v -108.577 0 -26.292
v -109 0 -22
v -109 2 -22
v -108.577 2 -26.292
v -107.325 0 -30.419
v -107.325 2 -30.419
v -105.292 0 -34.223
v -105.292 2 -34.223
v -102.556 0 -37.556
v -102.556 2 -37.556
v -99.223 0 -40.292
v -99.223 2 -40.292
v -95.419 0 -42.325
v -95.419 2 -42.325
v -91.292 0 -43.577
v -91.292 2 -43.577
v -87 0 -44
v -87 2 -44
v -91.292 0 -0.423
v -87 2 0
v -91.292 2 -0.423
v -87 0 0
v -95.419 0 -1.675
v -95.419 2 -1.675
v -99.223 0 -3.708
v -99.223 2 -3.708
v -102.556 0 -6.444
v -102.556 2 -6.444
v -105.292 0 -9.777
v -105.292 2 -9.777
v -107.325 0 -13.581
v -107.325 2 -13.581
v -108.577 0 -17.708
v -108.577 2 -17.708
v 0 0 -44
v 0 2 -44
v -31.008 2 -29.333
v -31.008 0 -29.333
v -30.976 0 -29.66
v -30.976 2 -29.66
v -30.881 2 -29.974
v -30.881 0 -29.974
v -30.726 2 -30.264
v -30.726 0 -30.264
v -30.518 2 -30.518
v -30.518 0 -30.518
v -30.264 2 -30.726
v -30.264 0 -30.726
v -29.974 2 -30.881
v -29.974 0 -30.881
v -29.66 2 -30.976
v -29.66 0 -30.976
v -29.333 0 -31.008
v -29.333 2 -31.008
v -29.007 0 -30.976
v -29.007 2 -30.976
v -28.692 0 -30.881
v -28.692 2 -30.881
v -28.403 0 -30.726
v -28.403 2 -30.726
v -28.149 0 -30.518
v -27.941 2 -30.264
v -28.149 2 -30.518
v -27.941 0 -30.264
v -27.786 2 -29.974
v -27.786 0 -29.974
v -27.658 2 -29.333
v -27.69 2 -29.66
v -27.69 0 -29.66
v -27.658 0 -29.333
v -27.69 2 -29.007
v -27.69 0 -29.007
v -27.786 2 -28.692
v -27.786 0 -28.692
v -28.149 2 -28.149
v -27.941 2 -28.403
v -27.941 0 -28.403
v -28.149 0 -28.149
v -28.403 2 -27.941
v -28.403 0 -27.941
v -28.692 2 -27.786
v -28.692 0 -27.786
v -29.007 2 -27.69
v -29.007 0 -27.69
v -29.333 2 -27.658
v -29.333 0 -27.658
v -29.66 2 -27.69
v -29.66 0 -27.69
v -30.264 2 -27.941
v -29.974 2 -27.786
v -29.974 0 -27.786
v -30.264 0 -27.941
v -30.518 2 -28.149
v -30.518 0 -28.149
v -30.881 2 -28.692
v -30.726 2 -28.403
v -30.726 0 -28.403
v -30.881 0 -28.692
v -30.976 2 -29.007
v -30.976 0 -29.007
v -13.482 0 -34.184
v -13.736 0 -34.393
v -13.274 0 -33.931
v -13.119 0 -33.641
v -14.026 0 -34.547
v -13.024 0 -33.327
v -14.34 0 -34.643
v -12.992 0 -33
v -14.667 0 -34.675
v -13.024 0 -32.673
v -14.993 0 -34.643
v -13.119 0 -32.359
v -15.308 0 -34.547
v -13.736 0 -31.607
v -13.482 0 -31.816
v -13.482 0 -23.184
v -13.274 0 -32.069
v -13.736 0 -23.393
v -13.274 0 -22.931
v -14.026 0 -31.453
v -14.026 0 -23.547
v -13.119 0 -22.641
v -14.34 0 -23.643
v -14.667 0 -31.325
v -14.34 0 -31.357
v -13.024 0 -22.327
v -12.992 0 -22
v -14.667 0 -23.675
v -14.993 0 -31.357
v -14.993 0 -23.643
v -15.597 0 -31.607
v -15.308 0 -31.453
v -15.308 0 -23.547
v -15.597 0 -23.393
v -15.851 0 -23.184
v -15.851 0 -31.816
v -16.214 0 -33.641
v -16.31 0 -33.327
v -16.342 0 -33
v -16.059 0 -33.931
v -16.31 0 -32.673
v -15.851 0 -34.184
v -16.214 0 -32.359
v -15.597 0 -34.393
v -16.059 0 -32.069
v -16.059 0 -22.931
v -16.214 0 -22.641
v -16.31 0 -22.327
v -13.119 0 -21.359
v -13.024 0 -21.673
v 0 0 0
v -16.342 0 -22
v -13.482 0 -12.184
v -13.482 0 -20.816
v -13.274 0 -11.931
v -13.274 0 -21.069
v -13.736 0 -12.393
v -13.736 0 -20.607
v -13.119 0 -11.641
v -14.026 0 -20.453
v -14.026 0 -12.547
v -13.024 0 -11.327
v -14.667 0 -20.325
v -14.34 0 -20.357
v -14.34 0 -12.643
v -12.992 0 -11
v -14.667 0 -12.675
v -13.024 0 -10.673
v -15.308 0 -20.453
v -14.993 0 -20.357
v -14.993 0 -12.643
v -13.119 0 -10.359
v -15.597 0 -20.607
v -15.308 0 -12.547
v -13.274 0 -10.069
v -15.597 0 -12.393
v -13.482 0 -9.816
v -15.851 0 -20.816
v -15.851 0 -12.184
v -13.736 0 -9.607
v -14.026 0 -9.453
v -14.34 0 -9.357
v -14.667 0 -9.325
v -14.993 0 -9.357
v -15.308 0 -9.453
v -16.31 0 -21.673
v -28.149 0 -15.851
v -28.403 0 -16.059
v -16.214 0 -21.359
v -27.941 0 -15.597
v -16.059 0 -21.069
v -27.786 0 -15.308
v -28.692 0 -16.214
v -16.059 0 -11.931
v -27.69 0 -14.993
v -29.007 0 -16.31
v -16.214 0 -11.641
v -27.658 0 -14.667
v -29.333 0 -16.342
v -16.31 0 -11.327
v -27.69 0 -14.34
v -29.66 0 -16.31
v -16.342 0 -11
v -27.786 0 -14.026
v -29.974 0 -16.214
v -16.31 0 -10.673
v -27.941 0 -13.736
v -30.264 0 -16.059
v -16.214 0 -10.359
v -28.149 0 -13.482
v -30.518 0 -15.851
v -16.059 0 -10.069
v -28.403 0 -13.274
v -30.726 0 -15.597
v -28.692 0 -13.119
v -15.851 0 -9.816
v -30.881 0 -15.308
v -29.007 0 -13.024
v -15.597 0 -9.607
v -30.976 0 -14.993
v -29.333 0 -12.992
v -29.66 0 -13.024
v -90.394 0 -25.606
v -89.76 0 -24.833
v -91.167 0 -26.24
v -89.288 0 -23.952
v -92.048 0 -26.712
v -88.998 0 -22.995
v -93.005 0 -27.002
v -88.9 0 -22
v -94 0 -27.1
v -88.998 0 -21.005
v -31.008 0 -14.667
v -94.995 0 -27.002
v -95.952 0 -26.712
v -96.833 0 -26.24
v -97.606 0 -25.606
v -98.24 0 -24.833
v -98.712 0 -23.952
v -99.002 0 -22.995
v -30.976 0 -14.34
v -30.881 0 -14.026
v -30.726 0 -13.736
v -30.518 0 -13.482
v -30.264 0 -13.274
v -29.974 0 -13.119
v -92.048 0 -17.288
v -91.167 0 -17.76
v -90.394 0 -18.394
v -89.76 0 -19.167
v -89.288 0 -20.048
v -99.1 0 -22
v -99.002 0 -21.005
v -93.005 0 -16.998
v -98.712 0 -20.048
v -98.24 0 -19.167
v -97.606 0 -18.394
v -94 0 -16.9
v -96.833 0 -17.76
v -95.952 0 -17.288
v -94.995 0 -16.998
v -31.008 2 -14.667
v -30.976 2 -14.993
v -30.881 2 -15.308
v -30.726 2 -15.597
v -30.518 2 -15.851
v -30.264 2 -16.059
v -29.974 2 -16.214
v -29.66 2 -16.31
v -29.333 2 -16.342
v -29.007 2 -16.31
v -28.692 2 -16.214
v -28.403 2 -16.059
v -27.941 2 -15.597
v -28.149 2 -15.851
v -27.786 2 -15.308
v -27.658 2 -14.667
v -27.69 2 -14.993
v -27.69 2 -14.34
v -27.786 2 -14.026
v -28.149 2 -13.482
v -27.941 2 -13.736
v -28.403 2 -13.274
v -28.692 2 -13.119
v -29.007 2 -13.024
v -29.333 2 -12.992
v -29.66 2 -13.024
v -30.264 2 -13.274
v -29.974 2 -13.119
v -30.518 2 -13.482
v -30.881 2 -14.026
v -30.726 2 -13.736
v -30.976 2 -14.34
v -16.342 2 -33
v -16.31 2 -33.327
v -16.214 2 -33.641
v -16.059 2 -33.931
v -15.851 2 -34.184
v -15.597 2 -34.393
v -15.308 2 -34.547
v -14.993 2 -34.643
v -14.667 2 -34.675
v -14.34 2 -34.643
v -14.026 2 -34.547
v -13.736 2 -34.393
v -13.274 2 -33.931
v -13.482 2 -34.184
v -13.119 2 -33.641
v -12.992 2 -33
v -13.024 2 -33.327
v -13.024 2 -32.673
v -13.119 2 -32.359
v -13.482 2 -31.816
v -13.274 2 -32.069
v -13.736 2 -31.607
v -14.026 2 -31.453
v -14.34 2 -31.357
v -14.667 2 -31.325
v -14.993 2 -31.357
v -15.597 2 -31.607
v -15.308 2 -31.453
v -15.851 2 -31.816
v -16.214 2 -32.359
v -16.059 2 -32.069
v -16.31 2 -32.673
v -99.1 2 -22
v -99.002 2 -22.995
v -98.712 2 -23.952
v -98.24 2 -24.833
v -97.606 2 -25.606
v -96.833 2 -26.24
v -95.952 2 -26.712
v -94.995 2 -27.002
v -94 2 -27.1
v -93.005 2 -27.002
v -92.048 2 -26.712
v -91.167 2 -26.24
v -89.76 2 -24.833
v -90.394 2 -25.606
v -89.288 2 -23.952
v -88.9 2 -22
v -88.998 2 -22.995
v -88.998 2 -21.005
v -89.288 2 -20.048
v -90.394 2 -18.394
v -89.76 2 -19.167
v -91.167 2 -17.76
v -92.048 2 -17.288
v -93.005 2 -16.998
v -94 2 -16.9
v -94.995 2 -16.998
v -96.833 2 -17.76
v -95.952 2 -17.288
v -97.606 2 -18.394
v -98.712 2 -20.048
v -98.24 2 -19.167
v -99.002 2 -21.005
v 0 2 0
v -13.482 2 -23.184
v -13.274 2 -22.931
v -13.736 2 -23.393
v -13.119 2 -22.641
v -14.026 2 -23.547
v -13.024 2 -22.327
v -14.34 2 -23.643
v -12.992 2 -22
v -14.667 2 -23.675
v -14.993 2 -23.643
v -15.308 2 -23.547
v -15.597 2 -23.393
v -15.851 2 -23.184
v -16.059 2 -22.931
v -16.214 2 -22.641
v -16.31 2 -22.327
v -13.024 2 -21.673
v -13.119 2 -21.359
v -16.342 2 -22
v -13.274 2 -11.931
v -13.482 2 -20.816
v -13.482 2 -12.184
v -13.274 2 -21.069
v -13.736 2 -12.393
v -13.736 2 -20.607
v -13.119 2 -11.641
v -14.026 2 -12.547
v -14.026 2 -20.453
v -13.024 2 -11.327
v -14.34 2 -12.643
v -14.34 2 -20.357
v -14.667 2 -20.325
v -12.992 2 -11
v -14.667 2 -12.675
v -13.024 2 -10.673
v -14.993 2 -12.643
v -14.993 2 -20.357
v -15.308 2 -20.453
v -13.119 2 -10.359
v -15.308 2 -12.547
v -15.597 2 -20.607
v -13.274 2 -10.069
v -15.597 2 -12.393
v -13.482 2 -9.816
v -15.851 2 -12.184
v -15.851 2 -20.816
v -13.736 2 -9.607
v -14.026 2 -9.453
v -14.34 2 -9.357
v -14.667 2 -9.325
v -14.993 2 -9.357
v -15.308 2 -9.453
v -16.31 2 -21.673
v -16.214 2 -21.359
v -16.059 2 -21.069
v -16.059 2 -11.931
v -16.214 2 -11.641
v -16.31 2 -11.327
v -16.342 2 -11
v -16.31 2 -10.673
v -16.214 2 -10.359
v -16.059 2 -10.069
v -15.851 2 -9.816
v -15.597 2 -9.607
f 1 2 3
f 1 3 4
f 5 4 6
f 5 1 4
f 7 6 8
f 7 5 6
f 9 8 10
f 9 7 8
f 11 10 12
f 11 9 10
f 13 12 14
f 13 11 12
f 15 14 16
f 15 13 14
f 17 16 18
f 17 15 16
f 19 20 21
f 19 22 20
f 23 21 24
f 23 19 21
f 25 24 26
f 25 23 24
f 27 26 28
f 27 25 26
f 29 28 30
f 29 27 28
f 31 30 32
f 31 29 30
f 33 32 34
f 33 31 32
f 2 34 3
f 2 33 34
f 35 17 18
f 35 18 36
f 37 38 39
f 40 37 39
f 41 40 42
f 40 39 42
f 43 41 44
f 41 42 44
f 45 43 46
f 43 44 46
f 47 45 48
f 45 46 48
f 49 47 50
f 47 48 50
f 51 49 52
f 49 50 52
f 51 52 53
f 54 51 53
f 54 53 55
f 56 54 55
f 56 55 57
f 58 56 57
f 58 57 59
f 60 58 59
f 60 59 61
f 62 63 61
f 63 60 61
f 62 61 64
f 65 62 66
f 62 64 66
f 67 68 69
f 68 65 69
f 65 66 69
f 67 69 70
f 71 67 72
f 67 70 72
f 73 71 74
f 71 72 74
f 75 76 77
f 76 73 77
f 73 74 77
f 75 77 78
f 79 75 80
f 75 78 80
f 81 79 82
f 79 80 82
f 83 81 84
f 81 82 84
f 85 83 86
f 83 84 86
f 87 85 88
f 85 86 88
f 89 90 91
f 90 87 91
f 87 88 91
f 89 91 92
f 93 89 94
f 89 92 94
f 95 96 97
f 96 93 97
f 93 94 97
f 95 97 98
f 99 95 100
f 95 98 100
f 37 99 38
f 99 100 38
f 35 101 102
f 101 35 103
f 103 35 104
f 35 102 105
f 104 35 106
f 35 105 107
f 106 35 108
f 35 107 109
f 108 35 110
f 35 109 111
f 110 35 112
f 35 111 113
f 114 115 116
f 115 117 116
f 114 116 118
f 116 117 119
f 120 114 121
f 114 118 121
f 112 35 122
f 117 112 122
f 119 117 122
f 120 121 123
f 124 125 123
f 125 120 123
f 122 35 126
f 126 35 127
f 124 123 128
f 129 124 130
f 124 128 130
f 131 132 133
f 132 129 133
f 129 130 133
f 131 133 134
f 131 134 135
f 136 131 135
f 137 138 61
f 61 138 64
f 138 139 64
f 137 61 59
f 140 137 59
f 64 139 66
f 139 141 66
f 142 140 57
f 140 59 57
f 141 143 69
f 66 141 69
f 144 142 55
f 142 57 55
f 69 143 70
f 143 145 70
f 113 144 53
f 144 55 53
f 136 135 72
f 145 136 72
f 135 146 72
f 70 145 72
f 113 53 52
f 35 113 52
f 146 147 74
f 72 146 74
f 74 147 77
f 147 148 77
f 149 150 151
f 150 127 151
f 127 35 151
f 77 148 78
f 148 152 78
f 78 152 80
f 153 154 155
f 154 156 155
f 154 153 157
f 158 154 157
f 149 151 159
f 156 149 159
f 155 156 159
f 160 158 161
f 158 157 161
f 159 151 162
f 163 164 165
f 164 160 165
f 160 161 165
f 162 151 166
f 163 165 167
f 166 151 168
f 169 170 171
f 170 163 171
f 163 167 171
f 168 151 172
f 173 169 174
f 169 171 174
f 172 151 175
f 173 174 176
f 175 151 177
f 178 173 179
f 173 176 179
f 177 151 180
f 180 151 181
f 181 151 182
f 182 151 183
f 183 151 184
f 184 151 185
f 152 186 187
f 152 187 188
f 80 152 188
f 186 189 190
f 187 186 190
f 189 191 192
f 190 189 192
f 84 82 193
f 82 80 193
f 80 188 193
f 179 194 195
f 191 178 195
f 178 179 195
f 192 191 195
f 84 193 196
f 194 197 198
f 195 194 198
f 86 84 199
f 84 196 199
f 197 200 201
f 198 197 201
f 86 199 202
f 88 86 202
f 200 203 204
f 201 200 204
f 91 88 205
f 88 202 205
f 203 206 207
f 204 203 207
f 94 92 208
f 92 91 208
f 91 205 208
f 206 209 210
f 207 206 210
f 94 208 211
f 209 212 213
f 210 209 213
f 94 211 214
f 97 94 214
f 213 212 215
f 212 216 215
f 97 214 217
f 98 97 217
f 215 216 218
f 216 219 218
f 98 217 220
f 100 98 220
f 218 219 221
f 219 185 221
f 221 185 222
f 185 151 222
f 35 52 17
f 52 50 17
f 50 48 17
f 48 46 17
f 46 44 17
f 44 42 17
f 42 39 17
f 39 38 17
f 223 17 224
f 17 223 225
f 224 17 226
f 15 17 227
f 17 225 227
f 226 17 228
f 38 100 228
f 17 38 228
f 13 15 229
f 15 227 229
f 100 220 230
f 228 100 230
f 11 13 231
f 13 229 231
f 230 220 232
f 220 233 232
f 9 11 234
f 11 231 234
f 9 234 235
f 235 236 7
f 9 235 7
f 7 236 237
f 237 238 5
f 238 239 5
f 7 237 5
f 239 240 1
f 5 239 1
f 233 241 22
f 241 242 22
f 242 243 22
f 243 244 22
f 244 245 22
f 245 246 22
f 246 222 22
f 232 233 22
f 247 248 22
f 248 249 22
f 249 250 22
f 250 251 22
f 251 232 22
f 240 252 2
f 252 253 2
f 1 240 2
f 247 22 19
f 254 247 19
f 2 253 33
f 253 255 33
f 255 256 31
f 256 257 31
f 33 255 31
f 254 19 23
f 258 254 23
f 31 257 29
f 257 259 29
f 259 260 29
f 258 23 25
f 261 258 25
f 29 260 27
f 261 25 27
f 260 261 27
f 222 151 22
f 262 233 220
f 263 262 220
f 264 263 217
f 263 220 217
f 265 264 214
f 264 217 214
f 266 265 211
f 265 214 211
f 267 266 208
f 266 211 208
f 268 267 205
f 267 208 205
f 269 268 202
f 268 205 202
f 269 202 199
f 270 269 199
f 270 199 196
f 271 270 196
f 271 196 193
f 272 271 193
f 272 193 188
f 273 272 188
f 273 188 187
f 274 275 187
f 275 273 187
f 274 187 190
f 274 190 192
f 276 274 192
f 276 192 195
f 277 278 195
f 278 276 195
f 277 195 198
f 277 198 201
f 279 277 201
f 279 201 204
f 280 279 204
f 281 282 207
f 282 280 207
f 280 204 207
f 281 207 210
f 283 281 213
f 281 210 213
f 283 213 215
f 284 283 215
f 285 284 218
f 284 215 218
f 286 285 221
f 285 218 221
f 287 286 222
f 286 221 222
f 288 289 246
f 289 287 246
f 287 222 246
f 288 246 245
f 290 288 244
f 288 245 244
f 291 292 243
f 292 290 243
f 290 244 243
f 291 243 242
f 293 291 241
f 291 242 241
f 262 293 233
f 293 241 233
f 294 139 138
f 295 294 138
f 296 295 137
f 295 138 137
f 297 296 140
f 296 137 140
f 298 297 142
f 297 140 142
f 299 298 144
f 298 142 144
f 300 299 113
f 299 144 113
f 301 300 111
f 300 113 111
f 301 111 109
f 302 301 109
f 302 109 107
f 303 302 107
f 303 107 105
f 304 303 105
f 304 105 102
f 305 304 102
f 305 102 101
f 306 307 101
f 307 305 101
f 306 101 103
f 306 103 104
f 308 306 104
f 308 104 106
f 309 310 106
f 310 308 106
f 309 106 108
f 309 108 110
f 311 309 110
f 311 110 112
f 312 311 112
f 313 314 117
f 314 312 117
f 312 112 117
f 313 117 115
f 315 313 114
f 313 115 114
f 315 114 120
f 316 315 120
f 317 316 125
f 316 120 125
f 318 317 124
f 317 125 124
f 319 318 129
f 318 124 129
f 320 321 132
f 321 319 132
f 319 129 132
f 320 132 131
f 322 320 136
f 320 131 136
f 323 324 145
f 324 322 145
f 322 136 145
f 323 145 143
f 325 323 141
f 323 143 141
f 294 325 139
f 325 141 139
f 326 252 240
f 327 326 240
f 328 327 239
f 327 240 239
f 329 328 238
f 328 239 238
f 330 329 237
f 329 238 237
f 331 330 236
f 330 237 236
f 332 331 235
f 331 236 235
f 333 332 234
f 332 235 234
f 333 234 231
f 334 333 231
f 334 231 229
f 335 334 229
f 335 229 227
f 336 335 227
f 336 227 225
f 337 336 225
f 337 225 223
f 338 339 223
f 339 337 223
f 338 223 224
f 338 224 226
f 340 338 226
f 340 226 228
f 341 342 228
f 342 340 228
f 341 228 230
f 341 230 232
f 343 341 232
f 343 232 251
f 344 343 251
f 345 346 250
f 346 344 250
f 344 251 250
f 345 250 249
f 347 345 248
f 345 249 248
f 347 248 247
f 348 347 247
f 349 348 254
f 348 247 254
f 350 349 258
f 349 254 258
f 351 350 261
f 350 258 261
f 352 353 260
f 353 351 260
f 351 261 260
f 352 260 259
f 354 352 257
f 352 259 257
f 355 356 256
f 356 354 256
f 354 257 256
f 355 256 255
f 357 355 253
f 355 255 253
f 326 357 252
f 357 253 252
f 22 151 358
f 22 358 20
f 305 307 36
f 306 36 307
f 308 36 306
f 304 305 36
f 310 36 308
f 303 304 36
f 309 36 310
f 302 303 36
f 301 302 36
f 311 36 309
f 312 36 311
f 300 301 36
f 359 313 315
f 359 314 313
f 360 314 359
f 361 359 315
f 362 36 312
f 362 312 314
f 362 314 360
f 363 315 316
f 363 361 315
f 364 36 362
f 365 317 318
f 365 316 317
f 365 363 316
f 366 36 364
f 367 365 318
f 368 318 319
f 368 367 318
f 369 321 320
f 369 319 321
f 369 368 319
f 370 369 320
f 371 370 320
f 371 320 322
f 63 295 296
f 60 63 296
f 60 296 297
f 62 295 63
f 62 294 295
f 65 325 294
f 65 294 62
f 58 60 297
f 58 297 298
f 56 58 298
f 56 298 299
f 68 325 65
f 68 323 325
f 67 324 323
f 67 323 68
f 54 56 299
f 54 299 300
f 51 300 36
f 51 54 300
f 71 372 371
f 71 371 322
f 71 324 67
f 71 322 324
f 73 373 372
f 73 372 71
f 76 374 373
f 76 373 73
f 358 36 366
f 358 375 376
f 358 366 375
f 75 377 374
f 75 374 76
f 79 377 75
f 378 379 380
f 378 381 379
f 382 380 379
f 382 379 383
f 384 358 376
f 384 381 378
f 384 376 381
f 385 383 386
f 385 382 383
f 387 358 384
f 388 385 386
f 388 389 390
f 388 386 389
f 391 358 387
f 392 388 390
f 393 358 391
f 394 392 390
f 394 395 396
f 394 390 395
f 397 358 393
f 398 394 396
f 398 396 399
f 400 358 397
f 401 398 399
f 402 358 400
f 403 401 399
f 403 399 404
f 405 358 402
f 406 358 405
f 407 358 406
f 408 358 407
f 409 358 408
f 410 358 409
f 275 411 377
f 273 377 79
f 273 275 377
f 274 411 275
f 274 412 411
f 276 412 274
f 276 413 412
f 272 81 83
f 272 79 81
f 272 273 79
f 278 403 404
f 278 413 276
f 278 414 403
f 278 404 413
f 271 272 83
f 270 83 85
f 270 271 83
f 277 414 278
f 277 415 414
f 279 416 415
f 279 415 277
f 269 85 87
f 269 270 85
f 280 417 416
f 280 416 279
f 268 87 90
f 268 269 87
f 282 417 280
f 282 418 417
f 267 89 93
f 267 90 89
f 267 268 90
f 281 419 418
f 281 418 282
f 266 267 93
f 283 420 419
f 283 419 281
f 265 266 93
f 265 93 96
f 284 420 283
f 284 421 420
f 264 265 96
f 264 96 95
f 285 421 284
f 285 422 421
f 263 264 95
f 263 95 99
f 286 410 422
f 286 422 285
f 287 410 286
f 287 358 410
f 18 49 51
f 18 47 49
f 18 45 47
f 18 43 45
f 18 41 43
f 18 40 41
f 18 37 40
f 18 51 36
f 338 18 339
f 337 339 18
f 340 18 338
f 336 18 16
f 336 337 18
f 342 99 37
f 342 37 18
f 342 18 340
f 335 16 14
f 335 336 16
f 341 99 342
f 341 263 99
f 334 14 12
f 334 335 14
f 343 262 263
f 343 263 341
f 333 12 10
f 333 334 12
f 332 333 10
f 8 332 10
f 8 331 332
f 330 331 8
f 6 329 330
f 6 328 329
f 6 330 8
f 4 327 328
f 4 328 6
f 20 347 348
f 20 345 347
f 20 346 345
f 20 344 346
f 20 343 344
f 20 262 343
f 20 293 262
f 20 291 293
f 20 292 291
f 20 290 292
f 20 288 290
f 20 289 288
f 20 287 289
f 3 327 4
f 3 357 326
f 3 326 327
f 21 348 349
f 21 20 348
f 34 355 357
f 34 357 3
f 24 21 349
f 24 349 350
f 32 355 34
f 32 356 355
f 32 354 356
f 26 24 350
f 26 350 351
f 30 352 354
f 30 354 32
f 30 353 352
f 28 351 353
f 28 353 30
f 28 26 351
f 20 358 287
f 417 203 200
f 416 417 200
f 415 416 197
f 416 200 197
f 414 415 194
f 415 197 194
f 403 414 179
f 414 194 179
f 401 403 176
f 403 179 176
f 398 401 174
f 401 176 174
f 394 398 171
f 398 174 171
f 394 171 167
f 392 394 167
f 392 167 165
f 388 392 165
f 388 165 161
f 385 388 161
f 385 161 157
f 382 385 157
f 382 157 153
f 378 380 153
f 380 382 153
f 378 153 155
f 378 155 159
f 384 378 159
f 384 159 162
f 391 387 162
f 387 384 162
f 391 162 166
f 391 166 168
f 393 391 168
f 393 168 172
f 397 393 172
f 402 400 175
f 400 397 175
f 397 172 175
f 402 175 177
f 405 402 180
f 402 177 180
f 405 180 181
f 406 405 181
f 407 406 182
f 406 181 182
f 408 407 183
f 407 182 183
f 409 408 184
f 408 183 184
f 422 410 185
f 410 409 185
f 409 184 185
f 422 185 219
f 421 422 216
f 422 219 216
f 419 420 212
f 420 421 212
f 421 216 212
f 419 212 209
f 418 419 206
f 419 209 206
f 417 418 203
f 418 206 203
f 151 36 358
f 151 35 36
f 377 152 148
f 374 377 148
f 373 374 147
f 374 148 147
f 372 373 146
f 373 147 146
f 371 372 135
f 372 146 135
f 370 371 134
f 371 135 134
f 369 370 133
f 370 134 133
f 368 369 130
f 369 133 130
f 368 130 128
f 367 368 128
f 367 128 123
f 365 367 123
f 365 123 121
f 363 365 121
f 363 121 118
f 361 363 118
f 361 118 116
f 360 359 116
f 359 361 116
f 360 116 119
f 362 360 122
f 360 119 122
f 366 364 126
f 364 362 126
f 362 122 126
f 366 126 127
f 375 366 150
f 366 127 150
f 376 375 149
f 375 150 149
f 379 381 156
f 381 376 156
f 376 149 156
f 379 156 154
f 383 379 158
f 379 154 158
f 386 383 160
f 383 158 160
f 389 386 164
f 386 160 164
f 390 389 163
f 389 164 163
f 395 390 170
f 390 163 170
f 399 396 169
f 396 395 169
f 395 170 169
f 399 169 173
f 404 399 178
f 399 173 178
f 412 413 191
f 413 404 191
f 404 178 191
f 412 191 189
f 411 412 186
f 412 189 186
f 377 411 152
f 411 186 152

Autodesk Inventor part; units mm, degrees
ref_plane "YZ Plane" through (0, 0, 0) normal (1, 0, 0) x (0, 1, 0)
ref_plane "XZ Plane" through (0, 0, 0) normal (0, 1, 0) x (-1, 0, 0)
ref_plane "XY Plane" through (0, 0, 0) normal (0, 0, 1) x (1, 0, 0)
sketch "Sketch2" plane through (0, 0, 0) normal (0, 1, 0) x (-1, 0, 0)
  line L0 (0, 0) -> (109, 0)
  line L1 (109, 0) -> (109, -44)
  line L2 (109, -44) -> (0, -44)
  line L3 (0, -44) -> (0, 0)
  line L4 (44, 0) -> (44, -44) construction
  arc A0 (87, -44) -> (87, 0) centre (87, -22) ccw
  circle A1 centre (94, -22) radius 5.1
  circle A2 centre (29.3333, -14.6667) radius 1.675
  circle A3 centre (29.3333, -29.3333) radius 1.675
  circle A4 centre (14.6667, -11) radius 1.675
  circle A5 centre (14.6667, -22) radius 1.675
  circle A6 centre (14.6667, -33) radius 1.675
  dimension "d36" = 44
  dimension "d37" = 44
  dimension "d38" = 65
  dimension "d41" = 10.2
  dimension "d42" = 22
  dimension "d43" = 15
  dimension "d44" = 14.6667
  dimension "d45" = 14.6667
  dimension "d46" = 14.6667
  dimension "d47" = 11
  dimension "d48" = 11
  dimension "d49" = 11
  dimension "d50" = 11
  dimension "d51" = 3.35
  dimension "d52" = 3.35
  dimension "d53" = 3.35
  dimension "d54" = 3.35
  dimension "d55" = 3.35
  dimension "d56" = 14.6667
  dimension "d57" = 14.6667
  dimension "d58" = 14.6667
  dimension "d59" = 14.6667
extrude "Plate3" add sketch "Sketch2" along normal blind 2 contours L0 A0 L2 L3
equation "\"d42\" = 0.5 * d37"
equation "\"d44\" = 0.333333 * d37"
equation "\"d45\" = d44"
equation "\"d47\" = 0.25 * d37"
equation "\"d48\" = d47"
equation "\"d49\" = d47"
equation "\"d52\" = d51"
equation "\"d53\" = d51"
equation "\"d54\" = d51"
equation "\"d55\" = d51"
equation "\"d56\" = 0.333333 * d36"
equation "\"d57\" = d56"
equation "\"d58\" = d46"
equation "\"d59\" = d46"
equation "\"d60\" = Thickness"
equation "\"BendRadius\" = Thickness"
equation "\"BendReliefWidth\" = Thickness"
equation "\"BendReliefDepth\" = 0.5 * Thickness"
equation "\"CornerReliefSize\" = 4 * Thickness"
equation "\"MinimumRemnant\" = 2 * Thickness"
equation "\"TransitionRadius\" = BendRadius"
equation "\"JacobiRadiusSize\" = BendRadius"
equation "\"GapSize\" = Thickness"
equation "\"Thickness\" = 2"
properties part number "Beslag ekstra håndtag"
